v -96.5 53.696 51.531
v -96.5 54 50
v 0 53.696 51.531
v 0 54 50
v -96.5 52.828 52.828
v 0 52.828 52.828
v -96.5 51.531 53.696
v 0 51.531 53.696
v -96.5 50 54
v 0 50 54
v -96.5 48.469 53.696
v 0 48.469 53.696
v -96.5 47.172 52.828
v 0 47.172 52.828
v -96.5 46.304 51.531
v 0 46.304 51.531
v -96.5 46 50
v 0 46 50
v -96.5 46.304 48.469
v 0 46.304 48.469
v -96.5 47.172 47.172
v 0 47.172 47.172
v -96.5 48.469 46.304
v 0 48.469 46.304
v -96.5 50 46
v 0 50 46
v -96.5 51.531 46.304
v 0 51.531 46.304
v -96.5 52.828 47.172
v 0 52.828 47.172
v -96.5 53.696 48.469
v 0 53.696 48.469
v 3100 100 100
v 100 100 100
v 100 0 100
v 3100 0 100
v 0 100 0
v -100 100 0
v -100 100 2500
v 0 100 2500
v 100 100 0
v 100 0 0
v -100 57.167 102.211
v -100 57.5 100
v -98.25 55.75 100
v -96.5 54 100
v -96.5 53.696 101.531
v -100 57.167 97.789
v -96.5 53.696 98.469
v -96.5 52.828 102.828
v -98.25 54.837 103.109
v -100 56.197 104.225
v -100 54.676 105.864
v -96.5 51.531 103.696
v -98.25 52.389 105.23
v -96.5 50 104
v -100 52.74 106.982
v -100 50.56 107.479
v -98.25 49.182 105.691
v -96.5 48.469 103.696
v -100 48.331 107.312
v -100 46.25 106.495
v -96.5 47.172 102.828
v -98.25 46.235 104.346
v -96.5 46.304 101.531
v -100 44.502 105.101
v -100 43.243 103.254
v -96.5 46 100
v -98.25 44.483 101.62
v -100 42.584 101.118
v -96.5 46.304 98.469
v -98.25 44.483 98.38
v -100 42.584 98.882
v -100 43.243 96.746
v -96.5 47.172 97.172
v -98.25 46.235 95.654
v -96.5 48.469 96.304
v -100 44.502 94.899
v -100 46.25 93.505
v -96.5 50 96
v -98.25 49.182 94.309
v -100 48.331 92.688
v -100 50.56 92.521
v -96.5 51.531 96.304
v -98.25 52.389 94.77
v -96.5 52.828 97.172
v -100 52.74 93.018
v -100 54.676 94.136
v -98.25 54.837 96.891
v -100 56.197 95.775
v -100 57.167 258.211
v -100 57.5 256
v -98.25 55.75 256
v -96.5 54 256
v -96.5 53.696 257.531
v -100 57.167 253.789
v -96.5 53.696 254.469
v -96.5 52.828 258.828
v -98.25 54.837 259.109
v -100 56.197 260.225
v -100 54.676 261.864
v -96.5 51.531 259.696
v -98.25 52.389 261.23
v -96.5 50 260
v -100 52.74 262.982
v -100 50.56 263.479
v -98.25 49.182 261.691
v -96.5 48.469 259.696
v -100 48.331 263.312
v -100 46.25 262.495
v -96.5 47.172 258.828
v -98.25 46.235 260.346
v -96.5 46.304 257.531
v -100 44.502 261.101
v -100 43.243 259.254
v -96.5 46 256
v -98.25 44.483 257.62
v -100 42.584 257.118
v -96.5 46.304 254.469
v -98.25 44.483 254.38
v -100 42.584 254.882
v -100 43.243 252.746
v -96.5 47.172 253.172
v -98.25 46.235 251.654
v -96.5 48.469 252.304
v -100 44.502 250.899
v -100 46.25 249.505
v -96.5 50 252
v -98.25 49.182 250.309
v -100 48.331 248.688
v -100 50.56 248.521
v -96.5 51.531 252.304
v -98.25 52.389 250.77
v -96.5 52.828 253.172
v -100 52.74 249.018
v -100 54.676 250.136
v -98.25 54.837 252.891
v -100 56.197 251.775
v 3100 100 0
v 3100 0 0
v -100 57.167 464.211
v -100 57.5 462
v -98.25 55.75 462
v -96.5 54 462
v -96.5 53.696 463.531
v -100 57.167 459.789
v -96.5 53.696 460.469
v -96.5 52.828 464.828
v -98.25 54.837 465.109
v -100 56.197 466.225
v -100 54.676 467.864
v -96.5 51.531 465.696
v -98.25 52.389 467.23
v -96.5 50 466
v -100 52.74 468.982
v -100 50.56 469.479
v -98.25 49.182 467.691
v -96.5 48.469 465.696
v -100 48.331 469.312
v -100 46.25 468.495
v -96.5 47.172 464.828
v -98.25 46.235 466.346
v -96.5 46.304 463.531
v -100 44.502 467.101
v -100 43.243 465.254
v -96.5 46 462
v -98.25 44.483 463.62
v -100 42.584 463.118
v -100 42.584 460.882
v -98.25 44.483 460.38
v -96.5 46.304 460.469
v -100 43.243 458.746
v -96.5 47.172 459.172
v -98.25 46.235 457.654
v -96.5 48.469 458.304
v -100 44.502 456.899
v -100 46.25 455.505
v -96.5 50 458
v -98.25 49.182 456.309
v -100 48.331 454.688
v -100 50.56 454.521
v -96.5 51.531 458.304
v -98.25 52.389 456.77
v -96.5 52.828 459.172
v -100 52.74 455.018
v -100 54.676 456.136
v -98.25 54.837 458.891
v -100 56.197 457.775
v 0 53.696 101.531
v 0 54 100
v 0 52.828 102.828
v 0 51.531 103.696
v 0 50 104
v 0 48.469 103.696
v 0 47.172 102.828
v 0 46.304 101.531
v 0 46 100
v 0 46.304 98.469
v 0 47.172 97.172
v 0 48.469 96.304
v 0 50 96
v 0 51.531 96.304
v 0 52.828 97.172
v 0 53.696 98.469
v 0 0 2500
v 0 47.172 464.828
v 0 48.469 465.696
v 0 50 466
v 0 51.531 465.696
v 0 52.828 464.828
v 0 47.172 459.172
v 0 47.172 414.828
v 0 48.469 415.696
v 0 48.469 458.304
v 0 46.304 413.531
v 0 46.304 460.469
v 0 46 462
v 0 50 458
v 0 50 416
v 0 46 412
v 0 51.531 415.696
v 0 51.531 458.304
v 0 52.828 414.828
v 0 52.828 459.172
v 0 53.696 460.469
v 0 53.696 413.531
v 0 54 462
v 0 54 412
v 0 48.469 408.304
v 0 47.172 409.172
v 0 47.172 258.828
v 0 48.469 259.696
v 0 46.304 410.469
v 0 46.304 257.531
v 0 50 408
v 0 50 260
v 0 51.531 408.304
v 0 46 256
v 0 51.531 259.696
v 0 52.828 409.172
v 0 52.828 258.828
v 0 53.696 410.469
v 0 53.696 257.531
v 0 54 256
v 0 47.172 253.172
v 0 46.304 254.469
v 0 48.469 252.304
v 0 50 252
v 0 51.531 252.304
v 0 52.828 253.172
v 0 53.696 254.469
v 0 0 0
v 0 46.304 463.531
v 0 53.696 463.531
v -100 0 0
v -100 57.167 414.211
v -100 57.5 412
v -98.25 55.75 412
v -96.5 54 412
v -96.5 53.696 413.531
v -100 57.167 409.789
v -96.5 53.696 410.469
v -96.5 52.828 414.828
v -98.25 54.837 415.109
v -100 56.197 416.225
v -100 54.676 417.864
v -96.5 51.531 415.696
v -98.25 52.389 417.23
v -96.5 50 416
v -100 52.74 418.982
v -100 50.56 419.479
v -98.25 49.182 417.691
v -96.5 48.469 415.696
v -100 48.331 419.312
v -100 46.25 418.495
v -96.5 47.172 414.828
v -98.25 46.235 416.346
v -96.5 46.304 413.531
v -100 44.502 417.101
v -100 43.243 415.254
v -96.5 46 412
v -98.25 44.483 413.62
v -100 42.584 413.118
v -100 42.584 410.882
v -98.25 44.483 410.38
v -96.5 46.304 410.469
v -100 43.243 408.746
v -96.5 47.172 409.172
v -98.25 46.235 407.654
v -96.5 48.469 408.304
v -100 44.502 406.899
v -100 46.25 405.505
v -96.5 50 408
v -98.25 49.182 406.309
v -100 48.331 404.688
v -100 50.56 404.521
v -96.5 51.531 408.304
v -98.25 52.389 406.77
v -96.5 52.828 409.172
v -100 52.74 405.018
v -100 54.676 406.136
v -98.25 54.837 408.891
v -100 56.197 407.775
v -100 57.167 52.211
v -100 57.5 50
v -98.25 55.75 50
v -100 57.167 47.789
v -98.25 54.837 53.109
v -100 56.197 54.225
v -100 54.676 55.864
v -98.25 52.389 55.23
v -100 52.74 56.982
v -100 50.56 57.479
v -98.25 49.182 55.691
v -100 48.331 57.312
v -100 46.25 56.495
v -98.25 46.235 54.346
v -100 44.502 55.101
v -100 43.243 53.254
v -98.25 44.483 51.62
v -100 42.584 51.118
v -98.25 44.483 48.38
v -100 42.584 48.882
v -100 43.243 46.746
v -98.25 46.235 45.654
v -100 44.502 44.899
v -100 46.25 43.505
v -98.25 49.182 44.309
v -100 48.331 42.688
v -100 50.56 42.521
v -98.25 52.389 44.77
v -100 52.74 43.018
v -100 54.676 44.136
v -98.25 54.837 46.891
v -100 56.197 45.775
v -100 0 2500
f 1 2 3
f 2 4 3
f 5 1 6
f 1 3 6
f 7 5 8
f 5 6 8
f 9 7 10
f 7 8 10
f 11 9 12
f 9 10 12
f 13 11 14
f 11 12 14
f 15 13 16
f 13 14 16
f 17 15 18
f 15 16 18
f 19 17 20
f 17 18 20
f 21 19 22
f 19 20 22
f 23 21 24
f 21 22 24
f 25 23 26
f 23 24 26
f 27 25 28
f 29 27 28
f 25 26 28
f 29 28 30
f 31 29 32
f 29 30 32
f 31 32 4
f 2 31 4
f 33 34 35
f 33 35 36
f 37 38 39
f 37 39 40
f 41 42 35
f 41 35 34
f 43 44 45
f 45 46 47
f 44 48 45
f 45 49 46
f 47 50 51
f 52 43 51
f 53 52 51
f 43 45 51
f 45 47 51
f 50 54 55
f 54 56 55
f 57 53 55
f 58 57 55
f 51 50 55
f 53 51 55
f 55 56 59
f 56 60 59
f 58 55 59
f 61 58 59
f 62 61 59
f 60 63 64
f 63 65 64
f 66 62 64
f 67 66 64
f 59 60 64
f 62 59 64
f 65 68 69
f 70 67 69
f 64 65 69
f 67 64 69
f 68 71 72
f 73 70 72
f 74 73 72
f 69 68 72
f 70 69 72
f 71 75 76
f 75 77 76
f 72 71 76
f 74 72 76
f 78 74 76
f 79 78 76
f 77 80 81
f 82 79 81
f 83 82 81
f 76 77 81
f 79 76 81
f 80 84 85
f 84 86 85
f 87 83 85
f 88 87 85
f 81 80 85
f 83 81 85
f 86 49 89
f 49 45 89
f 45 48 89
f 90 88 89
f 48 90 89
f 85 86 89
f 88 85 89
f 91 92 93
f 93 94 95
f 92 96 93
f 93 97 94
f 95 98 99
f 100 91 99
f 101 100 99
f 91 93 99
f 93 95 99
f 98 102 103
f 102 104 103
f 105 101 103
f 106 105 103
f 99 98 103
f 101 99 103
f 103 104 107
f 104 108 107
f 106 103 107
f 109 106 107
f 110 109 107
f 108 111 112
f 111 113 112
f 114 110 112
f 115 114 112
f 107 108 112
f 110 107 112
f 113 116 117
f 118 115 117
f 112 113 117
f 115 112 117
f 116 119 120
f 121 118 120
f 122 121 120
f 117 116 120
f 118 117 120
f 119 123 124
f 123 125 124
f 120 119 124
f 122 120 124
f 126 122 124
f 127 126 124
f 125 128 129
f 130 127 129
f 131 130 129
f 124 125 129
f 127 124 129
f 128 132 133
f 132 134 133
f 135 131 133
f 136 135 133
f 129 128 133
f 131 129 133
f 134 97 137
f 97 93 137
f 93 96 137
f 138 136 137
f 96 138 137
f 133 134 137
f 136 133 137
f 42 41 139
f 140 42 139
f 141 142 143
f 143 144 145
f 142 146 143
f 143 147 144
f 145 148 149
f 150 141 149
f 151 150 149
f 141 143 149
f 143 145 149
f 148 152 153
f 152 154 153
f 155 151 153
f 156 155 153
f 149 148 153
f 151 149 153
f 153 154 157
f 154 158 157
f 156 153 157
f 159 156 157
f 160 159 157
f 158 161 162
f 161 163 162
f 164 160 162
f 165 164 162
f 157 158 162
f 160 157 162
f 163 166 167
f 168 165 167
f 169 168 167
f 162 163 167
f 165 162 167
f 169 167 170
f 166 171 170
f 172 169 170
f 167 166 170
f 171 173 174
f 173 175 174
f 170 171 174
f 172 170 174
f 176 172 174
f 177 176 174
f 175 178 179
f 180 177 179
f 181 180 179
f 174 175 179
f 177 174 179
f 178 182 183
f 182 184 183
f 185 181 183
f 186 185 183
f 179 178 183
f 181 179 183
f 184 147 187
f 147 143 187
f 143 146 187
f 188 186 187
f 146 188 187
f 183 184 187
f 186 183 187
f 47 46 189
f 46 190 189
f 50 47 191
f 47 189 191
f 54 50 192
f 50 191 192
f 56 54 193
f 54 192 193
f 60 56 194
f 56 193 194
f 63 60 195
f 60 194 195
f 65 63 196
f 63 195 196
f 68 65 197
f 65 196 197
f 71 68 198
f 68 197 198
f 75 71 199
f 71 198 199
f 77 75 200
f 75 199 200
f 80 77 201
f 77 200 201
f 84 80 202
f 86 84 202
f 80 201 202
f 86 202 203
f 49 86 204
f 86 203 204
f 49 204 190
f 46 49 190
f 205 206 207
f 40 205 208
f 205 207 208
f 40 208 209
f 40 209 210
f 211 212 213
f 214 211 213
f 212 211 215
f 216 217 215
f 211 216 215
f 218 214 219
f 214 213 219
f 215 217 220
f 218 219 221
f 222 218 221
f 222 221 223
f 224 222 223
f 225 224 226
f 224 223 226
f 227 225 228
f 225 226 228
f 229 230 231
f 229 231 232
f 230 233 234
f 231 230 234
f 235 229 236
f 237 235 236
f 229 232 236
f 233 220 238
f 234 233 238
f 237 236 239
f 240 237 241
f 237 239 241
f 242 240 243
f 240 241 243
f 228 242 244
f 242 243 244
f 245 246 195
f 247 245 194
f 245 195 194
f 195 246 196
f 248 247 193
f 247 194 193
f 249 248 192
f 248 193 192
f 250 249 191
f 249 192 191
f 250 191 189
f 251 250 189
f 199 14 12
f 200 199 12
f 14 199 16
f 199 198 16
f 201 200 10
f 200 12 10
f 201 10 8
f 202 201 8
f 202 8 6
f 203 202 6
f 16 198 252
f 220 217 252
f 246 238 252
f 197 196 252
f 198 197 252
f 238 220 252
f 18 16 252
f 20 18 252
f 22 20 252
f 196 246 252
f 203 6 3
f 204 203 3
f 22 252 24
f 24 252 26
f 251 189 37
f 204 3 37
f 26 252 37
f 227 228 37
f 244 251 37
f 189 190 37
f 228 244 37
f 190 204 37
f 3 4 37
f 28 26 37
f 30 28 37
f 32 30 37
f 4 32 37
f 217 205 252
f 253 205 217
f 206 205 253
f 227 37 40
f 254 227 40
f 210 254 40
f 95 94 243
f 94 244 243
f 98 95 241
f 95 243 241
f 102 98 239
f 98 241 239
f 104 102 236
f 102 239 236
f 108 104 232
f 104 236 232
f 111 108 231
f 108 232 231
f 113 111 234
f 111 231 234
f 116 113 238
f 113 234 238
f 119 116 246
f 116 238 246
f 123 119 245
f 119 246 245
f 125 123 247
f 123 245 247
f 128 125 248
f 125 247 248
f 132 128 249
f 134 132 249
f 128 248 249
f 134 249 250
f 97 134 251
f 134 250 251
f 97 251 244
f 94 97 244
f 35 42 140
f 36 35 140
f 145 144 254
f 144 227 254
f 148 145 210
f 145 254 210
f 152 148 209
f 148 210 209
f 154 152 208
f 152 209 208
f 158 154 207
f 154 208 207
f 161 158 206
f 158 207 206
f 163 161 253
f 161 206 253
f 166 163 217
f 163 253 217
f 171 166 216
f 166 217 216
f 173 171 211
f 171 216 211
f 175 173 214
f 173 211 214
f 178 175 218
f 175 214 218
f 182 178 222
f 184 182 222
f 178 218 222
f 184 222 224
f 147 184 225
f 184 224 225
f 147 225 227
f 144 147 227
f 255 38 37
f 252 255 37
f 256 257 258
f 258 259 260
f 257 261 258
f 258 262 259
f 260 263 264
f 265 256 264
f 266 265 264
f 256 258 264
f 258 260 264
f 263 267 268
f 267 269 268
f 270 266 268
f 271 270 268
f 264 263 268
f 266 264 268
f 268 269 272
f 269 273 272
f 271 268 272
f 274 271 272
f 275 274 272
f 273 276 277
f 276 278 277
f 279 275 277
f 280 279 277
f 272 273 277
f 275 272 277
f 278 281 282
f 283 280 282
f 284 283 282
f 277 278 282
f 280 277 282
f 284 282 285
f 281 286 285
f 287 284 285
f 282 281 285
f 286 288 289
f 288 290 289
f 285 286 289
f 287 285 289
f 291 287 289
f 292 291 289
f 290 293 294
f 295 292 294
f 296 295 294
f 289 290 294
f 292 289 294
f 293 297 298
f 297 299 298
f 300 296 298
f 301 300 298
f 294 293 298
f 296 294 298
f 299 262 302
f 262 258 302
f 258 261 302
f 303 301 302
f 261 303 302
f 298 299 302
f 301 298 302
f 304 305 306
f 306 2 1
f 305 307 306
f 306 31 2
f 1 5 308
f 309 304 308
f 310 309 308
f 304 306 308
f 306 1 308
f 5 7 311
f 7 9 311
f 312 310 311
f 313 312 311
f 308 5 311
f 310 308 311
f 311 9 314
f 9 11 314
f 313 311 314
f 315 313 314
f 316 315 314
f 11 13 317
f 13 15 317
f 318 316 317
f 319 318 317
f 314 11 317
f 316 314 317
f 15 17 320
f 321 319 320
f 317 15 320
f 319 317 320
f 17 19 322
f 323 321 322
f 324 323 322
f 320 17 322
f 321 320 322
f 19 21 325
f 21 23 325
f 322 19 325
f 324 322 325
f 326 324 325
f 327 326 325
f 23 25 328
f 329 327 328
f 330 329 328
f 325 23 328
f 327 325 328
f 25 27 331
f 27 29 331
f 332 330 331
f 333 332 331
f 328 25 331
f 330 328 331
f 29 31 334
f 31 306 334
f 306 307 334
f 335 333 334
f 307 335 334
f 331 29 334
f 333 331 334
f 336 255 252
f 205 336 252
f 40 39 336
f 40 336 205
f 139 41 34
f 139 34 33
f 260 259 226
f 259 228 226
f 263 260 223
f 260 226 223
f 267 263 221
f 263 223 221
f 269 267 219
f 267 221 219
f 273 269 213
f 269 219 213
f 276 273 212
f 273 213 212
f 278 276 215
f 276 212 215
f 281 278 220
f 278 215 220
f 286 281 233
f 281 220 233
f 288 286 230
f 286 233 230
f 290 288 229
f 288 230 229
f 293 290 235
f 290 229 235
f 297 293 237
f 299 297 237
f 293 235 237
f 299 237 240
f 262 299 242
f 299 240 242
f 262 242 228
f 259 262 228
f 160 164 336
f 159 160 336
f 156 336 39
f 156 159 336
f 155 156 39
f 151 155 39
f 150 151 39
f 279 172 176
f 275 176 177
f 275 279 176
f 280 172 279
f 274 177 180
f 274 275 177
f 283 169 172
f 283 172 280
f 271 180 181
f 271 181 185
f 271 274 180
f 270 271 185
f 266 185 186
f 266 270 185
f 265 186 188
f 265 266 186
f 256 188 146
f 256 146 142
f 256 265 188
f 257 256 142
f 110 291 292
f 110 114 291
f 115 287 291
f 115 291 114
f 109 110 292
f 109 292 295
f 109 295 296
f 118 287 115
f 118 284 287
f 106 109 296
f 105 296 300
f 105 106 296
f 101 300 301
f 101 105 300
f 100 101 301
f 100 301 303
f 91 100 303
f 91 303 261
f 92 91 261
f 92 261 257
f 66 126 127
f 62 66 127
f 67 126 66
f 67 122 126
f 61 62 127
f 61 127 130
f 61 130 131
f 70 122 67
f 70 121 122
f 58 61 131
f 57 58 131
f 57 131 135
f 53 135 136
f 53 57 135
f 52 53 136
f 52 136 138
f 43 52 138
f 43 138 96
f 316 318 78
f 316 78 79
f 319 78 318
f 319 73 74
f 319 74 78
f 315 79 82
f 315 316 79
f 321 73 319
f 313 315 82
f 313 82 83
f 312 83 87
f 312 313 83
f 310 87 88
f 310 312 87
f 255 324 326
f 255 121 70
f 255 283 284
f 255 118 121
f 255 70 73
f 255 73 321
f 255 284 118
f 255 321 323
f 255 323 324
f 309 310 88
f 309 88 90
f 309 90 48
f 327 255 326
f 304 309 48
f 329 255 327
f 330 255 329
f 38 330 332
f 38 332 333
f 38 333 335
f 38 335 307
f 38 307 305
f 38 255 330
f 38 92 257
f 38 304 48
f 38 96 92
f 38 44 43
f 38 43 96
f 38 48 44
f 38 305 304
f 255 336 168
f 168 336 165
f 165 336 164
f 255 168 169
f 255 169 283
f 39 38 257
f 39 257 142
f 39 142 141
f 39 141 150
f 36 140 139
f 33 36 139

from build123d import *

# Parameters (mm, degrees)
F0_W           = 100
F0_H           = 100
F1_DEPTH       = 2500
F2_W           = 3000
F2_H           = 100
F3_DEPTH       = 100
F5_D           = 8
F5_CSINK_D     = 15
F5_CSINK_ANGLE = 90


with BuildPart() as f1:
    # F0 (on Top) → F1 (new body)
    with BuildSketch(Plane.XY):
        with Locations((-50, 50)):
            Rectangle(F0_W, F0_H)
    extrude(amount=F1_DEPTH)

    # F5 (through all)
    with Locations(Plane(origin=(-100, 0, 0), x_dir=(0, -1, 0), z_dir=(-1, 0, 0))):
        with Locations((-50, 462), (-50, 412), (-50, 256), (-50, 100), (-50, 50)):
            CounterSinkHole(F5_D / 2, F5_CSINK_D / 2, counter_sink_angle=F5_CSINK_ANGLE)


with BuildPart() as f3:
    # F2 (on Top) → F3 (new body)
    with BuildSketch(Plane.XY):
        with Locations((1600, 50)):
            Rectangle(F2_W, F2_H)
    extrude(amount=F3_DEPTH)


solid = Compound([f1.part, f3.part])
